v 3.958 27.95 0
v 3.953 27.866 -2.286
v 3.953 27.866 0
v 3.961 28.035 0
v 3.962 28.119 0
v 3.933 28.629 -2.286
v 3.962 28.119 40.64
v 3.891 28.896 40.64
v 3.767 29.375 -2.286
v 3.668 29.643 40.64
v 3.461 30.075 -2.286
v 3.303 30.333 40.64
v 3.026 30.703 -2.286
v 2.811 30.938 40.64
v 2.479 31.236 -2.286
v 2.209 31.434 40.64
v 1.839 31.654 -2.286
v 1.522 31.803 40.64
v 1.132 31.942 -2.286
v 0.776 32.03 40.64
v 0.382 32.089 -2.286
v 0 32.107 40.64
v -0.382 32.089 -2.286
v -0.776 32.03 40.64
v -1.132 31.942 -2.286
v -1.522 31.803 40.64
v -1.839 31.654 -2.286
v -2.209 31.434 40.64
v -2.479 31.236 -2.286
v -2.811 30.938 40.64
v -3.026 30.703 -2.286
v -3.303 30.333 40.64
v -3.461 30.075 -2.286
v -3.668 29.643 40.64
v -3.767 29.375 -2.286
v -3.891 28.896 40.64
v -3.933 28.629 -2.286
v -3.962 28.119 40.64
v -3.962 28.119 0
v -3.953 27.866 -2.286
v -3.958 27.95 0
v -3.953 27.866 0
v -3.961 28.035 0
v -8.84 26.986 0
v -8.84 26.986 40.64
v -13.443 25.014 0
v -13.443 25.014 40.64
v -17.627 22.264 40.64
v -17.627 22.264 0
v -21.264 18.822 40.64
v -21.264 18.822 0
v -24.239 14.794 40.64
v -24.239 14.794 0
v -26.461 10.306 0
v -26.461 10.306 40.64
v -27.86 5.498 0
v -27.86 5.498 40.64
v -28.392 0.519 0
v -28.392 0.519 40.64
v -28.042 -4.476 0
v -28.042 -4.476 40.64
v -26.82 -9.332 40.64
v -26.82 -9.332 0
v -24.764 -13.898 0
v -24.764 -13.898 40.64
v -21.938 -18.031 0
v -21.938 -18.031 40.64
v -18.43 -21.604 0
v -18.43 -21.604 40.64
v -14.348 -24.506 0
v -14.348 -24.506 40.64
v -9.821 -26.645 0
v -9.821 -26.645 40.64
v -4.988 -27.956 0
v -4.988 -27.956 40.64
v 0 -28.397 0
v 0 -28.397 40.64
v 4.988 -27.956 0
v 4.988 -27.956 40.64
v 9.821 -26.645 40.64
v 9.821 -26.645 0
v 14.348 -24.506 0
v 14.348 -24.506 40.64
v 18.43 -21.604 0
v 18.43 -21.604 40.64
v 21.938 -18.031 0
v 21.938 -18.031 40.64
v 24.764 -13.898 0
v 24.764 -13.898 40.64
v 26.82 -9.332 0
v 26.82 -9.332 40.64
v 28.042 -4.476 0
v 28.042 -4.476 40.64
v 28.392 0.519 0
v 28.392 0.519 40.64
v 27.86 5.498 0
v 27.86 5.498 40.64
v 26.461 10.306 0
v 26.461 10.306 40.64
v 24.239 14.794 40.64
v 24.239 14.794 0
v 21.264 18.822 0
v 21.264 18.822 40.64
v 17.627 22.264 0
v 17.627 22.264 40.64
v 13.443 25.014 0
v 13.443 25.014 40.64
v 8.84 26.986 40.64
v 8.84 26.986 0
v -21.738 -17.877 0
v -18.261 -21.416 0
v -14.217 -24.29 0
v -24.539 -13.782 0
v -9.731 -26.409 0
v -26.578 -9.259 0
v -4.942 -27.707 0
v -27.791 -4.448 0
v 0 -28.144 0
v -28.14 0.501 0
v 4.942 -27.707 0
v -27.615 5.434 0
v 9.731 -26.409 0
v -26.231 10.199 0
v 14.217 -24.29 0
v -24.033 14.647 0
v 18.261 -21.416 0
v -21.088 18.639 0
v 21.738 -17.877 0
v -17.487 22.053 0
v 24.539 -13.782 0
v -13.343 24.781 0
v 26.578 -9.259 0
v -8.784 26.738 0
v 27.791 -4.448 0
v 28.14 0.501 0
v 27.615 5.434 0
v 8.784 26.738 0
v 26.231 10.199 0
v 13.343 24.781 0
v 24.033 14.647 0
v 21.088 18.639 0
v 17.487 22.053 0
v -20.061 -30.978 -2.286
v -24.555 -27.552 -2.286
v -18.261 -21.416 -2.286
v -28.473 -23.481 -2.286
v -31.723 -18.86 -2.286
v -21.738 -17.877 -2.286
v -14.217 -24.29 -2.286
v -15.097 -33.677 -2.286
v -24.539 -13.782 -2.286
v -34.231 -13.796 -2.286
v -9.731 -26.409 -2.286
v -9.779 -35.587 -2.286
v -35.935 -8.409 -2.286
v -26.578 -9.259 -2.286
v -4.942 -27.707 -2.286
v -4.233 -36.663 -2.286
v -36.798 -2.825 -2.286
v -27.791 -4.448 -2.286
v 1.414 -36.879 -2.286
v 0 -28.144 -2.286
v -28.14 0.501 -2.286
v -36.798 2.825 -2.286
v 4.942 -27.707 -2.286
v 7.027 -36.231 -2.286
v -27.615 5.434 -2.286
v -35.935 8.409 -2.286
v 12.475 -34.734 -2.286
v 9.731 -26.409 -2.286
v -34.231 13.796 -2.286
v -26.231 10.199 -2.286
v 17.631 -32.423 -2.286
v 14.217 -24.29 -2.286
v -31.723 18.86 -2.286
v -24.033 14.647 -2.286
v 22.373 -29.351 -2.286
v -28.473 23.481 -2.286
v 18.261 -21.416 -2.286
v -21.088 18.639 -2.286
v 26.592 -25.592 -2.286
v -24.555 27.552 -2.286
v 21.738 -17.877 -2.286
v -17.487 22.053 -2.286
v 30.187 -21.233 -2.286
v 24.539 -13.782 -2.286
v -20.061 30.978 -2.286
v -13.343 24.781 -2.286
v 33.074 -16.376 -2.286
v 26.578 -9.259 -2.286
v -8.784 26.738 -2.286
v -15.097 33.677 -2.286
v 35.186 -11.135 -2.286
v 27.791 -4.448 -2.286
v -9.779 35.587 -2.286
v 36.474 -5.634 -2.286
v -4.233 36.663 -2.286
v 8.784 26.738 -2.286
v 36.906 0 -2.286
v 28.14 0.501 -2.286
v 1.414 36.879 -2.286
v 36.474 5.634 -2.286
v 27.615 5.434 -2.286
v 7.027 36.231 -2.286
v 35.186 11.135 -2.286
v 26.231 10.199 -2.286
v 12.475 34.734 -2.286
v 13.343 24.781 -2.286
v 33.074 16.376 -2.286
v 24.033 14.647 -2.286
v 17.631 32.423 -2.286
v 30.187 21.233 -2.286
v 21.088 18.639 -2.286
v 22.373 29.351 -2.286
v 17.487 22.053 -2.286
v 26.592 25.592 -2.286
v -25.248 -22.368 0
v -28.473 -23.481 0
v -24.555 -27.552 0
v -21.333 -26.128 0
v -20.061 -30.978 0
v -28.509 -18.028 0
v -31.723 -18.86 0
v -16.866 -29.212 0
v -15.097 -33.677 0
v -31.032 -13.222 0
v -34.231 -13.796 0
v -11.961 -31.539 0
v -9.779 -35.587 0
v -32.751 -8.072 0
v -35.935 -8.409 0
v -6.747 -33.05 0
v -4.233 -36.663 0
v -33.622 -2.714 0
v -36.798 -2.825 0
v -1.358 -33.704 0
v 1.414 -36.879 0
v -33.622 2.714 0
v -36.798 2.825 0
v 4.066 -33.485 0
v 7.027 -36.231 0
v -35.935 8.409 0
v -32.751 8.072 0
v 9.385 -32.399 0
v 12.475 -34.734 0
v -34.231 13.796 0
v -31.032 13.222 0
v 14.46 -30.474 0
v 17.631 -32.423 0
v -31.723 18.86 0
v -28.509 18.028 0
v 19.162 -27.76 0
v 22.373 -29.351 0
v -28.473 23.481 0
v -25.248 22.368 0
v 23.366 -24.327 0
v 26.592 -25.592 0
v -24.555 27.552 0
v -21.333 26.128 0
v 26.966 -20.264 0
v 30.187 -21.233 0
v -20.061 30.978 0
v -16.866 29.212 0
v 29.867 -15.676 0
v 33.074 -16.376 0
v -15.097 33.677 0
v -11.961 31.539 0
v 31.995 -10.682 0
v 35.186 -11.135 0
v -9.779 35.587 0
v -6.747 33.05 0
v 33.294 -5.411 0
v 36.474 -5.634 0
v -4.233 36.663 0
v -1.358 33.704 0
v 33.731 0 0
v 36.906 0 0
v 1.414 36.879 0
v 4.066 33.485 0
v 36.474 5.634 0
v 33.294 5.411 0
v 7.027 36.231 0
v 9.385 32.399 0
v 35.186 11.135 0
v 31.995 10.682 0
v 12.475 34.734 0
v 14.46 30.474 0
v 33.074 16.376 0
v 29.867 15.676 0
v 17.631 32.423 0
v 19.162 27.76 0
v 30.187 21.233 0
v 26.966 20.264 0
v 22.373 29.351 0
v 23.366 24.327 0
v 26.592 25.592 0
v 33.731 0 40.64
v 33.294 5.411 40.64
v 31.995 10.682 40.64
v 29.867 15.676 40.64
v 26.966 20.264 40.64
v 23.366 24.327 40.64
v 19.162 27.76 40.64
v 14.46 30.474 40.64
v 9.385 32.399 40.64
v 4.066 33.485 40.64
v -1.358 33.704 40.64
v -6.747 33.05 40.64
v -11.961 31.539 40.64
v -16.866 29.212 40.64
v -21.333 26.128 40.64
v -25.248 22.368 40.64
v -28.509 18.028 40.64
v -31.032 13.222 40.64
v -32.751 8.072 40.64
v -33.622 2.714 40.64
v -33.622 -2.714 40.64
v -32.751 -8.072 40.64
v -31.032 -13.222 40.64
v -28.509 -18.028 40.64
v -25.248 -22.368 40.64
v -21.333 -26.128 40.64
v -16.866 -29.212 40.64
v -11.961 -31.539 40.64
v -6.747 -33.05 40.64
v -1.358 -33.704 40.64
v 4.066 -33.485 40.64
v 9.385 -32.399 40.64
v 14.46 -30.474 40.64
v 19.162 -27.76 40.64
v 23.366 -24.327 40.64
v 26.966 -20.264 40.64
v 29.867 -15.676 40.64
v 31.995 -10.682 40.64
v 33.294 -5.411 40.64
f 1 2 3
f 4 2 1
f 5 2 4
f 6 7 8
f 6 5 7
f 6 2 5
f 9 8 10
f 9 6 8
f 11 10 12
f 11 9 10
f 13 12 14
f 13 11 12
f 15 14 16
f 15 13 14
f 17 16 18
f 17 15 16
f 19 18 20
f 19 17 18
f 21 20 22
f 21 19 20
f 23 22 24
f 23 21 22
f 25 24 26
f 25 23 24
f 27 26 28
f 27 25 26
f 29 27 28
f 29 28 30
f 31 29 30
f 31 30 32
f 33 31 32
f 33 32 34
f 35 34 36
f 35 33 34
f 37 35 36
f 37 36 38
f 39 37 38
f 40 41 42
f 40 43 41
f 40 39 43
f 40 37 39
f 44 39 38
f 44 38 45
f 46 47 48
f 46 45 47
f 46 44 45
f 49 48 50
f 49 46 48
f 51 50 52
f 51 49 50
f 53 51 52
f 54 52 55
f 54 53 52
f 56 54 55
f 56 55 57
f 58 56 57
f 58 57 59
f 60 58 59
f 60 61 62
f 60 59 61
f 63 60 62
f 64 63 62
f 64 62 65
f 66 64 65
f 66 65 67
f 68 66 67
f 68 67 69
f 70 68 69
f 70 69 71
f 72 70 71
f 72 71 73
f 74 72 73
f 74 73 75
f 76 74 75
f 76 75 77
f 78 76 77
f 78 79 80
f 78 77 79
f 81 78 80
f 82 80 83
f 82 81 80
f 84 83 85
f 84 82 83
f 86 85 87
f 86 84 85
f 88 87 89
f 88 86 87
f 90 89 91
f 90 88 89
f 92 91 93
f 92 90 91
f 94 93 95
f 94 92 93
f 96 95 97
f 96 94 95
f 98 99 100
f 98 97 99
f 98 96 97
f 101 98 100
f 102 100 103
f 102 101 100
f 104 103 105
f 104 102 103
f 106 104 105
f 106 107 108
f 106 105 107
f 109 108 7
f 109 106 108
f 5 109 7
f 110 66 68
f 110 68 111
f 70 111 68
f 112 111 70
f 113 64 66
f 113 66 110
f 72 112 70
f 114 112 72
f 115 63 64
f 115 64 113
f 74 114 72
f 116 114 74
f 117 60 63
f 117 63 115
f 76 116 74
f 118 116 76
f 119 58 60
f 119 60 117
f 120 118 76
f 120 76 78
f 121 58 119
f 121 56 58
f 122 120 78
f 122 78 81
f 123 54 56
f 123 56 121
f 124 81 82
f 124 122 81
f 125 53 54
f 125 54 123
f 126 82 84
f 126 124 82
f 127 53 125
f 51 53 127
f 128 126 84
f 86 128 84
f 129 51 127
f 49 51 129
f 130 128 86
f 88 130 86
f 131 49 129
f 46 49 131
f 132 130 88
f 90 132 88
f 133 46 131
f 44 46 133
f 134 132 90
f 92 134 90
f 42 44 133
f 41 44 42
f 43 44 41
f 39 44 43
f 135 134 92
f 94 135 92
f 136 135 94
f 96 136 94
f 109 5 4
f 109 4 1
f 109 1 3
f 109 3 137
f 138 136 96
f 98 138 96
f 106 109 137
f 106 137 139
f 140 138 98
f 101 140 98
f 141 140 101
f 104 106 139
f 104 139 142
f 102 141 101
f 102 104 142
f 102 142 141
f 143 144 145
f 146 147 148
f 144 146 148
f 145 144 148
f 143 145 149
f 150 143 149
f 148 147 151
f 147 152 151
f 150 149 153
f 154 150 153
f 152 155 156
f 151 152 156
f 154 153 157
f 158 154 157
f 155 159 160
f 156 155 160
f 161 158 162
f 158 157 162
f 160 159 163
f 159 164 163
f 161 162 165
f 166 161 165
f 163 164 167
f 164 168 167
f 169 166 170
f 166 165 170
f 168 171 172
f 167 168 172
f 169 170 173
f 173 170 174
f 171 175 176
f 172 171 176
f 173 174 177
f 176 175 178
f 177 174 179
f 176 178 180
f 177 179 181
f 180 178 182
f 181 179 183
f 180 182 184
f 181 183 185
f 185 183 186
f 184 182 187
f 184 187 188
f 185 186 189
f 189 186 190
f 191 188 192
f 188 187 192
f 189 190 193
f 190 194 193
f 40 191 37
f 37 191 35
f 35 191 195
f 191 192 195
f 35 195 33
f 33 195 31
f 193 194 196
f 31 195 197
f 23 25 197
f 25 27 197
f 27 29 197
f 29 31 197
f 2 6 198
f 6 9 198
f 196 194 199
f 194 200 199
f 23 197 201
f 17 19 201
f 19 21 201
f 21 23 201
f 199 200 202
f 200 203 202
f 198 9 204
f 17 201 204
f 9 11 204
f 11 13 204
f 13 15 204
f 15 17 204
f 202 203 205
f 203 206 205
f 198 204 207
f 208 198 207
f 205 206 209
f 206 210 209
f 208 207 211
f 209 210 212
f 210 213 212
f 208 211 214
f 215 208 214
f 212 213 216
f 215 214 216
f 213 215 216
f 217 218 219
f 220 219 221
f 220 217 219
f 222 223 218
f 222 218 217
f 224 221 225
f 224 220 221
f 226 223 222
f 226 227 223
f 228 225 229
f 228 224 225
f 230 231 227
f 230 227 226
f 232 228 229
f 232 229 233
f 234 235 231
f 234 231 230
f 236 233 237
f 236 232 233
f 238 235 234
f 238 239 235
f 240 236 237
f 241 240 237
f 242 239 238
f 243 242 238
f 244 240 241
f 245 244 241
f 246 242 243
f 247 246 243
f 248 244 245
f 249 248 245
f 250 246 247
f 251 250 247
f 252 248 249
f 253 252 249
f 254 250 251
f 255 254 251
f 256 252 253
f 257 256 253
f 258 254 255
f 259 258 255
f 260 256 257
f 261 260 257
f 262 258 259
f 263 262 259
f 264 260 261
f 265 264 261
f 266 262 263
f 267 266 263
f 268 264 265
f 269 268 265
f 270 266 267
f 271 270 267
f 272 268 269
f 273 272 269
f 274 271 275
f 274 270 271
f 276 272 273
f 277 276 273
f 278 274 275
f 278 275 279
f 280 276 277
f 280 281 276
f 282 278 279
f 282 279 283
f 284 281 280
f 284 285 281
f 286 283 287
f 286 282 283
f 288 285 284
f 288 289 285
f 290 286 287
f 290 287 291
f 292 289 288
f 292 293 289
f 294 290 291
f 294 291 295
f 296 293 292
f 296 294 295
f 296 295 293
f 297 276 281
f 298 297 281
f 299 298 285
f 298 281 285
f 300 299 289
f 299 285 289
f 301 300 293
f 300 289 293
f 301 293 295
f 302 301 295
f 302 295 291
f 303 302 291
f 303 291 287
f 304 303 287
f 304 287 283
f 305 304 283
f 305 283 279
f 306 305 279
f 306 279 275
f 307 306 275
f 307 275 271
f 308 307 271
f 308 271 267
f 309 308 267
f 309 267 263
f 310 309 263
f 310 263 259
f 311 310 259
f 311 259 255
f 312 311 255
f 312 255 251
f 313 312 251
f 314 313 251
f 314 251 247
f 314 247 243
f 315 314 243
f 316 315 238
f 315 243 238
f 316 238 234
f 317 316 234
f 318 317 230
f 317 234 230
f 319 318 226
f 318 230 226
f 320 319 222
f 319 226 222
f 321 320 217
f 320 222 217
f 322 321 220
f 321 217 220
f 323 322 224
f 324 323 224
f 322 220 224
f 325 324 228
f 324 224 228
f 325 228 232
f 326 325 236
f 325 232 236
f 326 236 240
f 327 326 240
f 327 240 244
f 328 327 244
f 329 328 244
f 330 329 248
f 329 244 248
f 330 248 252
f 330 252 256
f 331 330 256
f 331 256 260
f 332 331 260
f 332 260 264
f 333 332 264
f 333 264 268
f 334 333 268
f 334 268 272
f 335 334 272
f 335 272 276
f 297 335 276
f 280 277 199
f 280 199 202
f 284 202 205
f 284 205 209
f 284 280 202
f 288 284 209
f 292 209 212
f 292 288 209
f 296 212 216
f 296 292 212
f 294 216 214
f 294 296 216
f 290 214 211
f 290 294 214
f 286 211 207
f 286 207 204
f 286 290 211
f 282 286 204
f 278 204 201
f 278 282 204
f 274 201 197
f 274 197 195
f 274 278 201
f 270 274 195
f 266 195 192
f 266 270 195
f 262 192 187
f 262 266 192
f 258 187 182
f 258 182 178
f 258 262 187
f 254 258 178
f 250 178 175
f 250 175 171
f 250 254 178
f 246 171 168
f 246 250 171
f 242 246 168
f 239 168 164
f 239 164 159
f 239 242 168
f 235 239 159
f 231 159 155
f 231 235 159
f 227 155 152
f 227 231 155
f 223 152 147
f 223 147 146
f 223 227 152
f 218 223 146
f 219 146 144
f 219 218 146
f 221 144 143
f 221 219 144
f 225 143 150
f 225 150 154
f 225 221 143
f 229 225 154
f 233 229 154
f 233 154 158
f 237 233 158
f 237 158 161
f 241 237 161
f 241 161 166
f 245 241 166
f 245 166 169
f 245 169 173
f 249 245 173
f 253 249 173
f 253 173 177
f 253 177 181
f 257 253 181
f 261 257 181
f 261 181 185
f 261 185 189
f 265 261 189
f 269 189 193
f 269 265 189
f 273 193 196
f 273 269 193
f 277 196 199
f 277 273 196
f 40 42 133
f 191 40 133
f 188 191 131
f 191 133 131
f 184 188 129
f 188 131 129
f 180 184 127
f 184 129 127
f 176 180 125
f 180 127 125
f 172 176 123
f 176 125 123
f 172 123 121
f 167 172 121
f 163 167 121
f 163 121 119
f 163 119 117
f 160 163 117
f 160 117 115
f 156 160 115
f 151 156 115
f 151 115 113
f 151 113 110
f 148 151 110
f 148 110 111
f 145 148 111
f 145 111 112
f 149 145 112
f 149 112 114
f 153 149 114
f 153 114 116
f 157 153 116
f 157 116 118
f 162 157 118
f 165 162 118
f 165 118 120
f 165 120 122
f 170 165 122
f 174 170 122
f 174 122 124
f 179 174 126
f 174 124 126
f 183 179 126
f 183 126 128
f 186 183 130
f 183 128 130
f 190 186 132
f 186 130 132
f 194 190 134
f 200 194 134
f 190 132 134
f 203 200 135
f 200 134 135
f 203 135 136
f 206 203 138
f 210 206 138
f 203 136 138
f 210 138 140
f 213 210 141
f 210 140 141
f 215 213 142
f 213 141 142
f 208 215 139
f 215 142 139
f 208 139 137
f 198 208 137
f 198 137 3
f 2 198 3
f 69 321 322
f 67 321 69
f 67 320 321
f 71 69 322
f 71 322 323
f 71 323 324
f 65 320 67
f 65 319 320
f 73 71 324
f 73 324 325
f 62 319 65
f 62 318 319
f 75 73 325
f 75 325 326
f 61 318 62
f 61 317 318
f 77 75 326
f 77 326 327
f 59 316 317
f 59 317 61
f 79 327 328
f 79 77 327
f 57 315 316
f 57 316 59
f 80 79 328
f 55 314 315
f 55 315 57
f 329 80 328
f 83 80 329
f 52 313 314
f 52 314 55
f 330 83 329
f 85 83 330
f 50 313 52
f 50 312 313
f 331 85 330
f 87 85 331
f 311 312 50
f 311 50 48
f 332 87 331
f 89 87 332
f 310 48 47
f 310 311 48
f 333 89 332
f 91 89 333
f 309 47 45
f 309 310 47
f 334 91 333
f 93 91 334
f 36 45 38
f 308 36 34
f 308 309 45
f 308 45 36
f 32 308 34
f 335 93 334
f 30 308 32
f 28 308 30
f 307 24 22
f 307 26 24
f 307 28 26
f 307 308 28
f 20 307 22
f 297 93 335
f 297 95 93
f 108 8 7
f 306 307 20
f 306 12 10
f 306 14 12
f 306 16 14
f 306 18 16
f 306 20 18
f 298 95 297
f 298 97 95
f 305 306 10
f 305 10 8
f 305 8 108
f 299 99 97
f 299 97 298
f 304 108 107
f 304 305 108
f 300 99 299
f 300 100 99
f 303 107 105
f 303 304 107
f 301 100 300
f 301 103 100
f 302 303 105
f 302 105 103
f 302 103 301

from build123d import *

# Parameters (mm, degrees)
BOSS_EXTRUDE1_DEPTH      = 40.64
BOSS_EXTRUDE1_DEPTH_BACK = 0.254
SKETCH1_R                = 33.7312
SKETCH1_R_2              = 28.3972
SKETCH3_R                = 36.9062
SKETCH3_R_2              = 28.144458554
BOSS_EXTRUDE2_DEPTH      = 2.286
CUT_EXTRUDE4_DEPTH       = 70.866
CUT_EXTRUDE4_DEPTH_BACK  = 4.064
SKETCH5_R                = 3.962523409


with BuildPart() as part:
    # Sketch1 → Boss-Extrude1 (new, two sides: drawn at the far end of the back side and taken through both)
    with BuildSketch(Plane.XY.offset(-BOSS_EXTRUDE1_DEPTH_BACK)):
        Circle(SKETCH1_R)
        Circle(SKETCH1_R_2, mode=Mode.SUBTRACT)
    extrude(amount=BOSS_EXTRUDE1_DEPTH + BOSS_EXTRUDE1_DEPTH_BACK)

    # Sketch3 → Boss-Extrude2 (add)
    with BuildSketch(Plane.XY):
        Circle(SKETCH3_R)
        Circle(SKETCH3_R_2, mode=Mode.SUBTRACT)
    extrude(amount=-BOSS_EXTRUDE2_DEPTH)

    # Sketch5 → Cut-Extrude4 (cut, two sides: drawn at the far end of the back side and taken through both)
    with BuildSketch(Plane.XY.offset(-CUT_EXTRUDE4_DEPTH_BACK)):
        with Locations((0, 28.144458554)):
            Circle(SKETCH5_R)
    extrude(amount=CUT_EXTRUDE4_DEPTH + CUT_EXTRUDE4_DEPTH_BACK, mode=Mode.SUBTRACT)


solid = part.part
